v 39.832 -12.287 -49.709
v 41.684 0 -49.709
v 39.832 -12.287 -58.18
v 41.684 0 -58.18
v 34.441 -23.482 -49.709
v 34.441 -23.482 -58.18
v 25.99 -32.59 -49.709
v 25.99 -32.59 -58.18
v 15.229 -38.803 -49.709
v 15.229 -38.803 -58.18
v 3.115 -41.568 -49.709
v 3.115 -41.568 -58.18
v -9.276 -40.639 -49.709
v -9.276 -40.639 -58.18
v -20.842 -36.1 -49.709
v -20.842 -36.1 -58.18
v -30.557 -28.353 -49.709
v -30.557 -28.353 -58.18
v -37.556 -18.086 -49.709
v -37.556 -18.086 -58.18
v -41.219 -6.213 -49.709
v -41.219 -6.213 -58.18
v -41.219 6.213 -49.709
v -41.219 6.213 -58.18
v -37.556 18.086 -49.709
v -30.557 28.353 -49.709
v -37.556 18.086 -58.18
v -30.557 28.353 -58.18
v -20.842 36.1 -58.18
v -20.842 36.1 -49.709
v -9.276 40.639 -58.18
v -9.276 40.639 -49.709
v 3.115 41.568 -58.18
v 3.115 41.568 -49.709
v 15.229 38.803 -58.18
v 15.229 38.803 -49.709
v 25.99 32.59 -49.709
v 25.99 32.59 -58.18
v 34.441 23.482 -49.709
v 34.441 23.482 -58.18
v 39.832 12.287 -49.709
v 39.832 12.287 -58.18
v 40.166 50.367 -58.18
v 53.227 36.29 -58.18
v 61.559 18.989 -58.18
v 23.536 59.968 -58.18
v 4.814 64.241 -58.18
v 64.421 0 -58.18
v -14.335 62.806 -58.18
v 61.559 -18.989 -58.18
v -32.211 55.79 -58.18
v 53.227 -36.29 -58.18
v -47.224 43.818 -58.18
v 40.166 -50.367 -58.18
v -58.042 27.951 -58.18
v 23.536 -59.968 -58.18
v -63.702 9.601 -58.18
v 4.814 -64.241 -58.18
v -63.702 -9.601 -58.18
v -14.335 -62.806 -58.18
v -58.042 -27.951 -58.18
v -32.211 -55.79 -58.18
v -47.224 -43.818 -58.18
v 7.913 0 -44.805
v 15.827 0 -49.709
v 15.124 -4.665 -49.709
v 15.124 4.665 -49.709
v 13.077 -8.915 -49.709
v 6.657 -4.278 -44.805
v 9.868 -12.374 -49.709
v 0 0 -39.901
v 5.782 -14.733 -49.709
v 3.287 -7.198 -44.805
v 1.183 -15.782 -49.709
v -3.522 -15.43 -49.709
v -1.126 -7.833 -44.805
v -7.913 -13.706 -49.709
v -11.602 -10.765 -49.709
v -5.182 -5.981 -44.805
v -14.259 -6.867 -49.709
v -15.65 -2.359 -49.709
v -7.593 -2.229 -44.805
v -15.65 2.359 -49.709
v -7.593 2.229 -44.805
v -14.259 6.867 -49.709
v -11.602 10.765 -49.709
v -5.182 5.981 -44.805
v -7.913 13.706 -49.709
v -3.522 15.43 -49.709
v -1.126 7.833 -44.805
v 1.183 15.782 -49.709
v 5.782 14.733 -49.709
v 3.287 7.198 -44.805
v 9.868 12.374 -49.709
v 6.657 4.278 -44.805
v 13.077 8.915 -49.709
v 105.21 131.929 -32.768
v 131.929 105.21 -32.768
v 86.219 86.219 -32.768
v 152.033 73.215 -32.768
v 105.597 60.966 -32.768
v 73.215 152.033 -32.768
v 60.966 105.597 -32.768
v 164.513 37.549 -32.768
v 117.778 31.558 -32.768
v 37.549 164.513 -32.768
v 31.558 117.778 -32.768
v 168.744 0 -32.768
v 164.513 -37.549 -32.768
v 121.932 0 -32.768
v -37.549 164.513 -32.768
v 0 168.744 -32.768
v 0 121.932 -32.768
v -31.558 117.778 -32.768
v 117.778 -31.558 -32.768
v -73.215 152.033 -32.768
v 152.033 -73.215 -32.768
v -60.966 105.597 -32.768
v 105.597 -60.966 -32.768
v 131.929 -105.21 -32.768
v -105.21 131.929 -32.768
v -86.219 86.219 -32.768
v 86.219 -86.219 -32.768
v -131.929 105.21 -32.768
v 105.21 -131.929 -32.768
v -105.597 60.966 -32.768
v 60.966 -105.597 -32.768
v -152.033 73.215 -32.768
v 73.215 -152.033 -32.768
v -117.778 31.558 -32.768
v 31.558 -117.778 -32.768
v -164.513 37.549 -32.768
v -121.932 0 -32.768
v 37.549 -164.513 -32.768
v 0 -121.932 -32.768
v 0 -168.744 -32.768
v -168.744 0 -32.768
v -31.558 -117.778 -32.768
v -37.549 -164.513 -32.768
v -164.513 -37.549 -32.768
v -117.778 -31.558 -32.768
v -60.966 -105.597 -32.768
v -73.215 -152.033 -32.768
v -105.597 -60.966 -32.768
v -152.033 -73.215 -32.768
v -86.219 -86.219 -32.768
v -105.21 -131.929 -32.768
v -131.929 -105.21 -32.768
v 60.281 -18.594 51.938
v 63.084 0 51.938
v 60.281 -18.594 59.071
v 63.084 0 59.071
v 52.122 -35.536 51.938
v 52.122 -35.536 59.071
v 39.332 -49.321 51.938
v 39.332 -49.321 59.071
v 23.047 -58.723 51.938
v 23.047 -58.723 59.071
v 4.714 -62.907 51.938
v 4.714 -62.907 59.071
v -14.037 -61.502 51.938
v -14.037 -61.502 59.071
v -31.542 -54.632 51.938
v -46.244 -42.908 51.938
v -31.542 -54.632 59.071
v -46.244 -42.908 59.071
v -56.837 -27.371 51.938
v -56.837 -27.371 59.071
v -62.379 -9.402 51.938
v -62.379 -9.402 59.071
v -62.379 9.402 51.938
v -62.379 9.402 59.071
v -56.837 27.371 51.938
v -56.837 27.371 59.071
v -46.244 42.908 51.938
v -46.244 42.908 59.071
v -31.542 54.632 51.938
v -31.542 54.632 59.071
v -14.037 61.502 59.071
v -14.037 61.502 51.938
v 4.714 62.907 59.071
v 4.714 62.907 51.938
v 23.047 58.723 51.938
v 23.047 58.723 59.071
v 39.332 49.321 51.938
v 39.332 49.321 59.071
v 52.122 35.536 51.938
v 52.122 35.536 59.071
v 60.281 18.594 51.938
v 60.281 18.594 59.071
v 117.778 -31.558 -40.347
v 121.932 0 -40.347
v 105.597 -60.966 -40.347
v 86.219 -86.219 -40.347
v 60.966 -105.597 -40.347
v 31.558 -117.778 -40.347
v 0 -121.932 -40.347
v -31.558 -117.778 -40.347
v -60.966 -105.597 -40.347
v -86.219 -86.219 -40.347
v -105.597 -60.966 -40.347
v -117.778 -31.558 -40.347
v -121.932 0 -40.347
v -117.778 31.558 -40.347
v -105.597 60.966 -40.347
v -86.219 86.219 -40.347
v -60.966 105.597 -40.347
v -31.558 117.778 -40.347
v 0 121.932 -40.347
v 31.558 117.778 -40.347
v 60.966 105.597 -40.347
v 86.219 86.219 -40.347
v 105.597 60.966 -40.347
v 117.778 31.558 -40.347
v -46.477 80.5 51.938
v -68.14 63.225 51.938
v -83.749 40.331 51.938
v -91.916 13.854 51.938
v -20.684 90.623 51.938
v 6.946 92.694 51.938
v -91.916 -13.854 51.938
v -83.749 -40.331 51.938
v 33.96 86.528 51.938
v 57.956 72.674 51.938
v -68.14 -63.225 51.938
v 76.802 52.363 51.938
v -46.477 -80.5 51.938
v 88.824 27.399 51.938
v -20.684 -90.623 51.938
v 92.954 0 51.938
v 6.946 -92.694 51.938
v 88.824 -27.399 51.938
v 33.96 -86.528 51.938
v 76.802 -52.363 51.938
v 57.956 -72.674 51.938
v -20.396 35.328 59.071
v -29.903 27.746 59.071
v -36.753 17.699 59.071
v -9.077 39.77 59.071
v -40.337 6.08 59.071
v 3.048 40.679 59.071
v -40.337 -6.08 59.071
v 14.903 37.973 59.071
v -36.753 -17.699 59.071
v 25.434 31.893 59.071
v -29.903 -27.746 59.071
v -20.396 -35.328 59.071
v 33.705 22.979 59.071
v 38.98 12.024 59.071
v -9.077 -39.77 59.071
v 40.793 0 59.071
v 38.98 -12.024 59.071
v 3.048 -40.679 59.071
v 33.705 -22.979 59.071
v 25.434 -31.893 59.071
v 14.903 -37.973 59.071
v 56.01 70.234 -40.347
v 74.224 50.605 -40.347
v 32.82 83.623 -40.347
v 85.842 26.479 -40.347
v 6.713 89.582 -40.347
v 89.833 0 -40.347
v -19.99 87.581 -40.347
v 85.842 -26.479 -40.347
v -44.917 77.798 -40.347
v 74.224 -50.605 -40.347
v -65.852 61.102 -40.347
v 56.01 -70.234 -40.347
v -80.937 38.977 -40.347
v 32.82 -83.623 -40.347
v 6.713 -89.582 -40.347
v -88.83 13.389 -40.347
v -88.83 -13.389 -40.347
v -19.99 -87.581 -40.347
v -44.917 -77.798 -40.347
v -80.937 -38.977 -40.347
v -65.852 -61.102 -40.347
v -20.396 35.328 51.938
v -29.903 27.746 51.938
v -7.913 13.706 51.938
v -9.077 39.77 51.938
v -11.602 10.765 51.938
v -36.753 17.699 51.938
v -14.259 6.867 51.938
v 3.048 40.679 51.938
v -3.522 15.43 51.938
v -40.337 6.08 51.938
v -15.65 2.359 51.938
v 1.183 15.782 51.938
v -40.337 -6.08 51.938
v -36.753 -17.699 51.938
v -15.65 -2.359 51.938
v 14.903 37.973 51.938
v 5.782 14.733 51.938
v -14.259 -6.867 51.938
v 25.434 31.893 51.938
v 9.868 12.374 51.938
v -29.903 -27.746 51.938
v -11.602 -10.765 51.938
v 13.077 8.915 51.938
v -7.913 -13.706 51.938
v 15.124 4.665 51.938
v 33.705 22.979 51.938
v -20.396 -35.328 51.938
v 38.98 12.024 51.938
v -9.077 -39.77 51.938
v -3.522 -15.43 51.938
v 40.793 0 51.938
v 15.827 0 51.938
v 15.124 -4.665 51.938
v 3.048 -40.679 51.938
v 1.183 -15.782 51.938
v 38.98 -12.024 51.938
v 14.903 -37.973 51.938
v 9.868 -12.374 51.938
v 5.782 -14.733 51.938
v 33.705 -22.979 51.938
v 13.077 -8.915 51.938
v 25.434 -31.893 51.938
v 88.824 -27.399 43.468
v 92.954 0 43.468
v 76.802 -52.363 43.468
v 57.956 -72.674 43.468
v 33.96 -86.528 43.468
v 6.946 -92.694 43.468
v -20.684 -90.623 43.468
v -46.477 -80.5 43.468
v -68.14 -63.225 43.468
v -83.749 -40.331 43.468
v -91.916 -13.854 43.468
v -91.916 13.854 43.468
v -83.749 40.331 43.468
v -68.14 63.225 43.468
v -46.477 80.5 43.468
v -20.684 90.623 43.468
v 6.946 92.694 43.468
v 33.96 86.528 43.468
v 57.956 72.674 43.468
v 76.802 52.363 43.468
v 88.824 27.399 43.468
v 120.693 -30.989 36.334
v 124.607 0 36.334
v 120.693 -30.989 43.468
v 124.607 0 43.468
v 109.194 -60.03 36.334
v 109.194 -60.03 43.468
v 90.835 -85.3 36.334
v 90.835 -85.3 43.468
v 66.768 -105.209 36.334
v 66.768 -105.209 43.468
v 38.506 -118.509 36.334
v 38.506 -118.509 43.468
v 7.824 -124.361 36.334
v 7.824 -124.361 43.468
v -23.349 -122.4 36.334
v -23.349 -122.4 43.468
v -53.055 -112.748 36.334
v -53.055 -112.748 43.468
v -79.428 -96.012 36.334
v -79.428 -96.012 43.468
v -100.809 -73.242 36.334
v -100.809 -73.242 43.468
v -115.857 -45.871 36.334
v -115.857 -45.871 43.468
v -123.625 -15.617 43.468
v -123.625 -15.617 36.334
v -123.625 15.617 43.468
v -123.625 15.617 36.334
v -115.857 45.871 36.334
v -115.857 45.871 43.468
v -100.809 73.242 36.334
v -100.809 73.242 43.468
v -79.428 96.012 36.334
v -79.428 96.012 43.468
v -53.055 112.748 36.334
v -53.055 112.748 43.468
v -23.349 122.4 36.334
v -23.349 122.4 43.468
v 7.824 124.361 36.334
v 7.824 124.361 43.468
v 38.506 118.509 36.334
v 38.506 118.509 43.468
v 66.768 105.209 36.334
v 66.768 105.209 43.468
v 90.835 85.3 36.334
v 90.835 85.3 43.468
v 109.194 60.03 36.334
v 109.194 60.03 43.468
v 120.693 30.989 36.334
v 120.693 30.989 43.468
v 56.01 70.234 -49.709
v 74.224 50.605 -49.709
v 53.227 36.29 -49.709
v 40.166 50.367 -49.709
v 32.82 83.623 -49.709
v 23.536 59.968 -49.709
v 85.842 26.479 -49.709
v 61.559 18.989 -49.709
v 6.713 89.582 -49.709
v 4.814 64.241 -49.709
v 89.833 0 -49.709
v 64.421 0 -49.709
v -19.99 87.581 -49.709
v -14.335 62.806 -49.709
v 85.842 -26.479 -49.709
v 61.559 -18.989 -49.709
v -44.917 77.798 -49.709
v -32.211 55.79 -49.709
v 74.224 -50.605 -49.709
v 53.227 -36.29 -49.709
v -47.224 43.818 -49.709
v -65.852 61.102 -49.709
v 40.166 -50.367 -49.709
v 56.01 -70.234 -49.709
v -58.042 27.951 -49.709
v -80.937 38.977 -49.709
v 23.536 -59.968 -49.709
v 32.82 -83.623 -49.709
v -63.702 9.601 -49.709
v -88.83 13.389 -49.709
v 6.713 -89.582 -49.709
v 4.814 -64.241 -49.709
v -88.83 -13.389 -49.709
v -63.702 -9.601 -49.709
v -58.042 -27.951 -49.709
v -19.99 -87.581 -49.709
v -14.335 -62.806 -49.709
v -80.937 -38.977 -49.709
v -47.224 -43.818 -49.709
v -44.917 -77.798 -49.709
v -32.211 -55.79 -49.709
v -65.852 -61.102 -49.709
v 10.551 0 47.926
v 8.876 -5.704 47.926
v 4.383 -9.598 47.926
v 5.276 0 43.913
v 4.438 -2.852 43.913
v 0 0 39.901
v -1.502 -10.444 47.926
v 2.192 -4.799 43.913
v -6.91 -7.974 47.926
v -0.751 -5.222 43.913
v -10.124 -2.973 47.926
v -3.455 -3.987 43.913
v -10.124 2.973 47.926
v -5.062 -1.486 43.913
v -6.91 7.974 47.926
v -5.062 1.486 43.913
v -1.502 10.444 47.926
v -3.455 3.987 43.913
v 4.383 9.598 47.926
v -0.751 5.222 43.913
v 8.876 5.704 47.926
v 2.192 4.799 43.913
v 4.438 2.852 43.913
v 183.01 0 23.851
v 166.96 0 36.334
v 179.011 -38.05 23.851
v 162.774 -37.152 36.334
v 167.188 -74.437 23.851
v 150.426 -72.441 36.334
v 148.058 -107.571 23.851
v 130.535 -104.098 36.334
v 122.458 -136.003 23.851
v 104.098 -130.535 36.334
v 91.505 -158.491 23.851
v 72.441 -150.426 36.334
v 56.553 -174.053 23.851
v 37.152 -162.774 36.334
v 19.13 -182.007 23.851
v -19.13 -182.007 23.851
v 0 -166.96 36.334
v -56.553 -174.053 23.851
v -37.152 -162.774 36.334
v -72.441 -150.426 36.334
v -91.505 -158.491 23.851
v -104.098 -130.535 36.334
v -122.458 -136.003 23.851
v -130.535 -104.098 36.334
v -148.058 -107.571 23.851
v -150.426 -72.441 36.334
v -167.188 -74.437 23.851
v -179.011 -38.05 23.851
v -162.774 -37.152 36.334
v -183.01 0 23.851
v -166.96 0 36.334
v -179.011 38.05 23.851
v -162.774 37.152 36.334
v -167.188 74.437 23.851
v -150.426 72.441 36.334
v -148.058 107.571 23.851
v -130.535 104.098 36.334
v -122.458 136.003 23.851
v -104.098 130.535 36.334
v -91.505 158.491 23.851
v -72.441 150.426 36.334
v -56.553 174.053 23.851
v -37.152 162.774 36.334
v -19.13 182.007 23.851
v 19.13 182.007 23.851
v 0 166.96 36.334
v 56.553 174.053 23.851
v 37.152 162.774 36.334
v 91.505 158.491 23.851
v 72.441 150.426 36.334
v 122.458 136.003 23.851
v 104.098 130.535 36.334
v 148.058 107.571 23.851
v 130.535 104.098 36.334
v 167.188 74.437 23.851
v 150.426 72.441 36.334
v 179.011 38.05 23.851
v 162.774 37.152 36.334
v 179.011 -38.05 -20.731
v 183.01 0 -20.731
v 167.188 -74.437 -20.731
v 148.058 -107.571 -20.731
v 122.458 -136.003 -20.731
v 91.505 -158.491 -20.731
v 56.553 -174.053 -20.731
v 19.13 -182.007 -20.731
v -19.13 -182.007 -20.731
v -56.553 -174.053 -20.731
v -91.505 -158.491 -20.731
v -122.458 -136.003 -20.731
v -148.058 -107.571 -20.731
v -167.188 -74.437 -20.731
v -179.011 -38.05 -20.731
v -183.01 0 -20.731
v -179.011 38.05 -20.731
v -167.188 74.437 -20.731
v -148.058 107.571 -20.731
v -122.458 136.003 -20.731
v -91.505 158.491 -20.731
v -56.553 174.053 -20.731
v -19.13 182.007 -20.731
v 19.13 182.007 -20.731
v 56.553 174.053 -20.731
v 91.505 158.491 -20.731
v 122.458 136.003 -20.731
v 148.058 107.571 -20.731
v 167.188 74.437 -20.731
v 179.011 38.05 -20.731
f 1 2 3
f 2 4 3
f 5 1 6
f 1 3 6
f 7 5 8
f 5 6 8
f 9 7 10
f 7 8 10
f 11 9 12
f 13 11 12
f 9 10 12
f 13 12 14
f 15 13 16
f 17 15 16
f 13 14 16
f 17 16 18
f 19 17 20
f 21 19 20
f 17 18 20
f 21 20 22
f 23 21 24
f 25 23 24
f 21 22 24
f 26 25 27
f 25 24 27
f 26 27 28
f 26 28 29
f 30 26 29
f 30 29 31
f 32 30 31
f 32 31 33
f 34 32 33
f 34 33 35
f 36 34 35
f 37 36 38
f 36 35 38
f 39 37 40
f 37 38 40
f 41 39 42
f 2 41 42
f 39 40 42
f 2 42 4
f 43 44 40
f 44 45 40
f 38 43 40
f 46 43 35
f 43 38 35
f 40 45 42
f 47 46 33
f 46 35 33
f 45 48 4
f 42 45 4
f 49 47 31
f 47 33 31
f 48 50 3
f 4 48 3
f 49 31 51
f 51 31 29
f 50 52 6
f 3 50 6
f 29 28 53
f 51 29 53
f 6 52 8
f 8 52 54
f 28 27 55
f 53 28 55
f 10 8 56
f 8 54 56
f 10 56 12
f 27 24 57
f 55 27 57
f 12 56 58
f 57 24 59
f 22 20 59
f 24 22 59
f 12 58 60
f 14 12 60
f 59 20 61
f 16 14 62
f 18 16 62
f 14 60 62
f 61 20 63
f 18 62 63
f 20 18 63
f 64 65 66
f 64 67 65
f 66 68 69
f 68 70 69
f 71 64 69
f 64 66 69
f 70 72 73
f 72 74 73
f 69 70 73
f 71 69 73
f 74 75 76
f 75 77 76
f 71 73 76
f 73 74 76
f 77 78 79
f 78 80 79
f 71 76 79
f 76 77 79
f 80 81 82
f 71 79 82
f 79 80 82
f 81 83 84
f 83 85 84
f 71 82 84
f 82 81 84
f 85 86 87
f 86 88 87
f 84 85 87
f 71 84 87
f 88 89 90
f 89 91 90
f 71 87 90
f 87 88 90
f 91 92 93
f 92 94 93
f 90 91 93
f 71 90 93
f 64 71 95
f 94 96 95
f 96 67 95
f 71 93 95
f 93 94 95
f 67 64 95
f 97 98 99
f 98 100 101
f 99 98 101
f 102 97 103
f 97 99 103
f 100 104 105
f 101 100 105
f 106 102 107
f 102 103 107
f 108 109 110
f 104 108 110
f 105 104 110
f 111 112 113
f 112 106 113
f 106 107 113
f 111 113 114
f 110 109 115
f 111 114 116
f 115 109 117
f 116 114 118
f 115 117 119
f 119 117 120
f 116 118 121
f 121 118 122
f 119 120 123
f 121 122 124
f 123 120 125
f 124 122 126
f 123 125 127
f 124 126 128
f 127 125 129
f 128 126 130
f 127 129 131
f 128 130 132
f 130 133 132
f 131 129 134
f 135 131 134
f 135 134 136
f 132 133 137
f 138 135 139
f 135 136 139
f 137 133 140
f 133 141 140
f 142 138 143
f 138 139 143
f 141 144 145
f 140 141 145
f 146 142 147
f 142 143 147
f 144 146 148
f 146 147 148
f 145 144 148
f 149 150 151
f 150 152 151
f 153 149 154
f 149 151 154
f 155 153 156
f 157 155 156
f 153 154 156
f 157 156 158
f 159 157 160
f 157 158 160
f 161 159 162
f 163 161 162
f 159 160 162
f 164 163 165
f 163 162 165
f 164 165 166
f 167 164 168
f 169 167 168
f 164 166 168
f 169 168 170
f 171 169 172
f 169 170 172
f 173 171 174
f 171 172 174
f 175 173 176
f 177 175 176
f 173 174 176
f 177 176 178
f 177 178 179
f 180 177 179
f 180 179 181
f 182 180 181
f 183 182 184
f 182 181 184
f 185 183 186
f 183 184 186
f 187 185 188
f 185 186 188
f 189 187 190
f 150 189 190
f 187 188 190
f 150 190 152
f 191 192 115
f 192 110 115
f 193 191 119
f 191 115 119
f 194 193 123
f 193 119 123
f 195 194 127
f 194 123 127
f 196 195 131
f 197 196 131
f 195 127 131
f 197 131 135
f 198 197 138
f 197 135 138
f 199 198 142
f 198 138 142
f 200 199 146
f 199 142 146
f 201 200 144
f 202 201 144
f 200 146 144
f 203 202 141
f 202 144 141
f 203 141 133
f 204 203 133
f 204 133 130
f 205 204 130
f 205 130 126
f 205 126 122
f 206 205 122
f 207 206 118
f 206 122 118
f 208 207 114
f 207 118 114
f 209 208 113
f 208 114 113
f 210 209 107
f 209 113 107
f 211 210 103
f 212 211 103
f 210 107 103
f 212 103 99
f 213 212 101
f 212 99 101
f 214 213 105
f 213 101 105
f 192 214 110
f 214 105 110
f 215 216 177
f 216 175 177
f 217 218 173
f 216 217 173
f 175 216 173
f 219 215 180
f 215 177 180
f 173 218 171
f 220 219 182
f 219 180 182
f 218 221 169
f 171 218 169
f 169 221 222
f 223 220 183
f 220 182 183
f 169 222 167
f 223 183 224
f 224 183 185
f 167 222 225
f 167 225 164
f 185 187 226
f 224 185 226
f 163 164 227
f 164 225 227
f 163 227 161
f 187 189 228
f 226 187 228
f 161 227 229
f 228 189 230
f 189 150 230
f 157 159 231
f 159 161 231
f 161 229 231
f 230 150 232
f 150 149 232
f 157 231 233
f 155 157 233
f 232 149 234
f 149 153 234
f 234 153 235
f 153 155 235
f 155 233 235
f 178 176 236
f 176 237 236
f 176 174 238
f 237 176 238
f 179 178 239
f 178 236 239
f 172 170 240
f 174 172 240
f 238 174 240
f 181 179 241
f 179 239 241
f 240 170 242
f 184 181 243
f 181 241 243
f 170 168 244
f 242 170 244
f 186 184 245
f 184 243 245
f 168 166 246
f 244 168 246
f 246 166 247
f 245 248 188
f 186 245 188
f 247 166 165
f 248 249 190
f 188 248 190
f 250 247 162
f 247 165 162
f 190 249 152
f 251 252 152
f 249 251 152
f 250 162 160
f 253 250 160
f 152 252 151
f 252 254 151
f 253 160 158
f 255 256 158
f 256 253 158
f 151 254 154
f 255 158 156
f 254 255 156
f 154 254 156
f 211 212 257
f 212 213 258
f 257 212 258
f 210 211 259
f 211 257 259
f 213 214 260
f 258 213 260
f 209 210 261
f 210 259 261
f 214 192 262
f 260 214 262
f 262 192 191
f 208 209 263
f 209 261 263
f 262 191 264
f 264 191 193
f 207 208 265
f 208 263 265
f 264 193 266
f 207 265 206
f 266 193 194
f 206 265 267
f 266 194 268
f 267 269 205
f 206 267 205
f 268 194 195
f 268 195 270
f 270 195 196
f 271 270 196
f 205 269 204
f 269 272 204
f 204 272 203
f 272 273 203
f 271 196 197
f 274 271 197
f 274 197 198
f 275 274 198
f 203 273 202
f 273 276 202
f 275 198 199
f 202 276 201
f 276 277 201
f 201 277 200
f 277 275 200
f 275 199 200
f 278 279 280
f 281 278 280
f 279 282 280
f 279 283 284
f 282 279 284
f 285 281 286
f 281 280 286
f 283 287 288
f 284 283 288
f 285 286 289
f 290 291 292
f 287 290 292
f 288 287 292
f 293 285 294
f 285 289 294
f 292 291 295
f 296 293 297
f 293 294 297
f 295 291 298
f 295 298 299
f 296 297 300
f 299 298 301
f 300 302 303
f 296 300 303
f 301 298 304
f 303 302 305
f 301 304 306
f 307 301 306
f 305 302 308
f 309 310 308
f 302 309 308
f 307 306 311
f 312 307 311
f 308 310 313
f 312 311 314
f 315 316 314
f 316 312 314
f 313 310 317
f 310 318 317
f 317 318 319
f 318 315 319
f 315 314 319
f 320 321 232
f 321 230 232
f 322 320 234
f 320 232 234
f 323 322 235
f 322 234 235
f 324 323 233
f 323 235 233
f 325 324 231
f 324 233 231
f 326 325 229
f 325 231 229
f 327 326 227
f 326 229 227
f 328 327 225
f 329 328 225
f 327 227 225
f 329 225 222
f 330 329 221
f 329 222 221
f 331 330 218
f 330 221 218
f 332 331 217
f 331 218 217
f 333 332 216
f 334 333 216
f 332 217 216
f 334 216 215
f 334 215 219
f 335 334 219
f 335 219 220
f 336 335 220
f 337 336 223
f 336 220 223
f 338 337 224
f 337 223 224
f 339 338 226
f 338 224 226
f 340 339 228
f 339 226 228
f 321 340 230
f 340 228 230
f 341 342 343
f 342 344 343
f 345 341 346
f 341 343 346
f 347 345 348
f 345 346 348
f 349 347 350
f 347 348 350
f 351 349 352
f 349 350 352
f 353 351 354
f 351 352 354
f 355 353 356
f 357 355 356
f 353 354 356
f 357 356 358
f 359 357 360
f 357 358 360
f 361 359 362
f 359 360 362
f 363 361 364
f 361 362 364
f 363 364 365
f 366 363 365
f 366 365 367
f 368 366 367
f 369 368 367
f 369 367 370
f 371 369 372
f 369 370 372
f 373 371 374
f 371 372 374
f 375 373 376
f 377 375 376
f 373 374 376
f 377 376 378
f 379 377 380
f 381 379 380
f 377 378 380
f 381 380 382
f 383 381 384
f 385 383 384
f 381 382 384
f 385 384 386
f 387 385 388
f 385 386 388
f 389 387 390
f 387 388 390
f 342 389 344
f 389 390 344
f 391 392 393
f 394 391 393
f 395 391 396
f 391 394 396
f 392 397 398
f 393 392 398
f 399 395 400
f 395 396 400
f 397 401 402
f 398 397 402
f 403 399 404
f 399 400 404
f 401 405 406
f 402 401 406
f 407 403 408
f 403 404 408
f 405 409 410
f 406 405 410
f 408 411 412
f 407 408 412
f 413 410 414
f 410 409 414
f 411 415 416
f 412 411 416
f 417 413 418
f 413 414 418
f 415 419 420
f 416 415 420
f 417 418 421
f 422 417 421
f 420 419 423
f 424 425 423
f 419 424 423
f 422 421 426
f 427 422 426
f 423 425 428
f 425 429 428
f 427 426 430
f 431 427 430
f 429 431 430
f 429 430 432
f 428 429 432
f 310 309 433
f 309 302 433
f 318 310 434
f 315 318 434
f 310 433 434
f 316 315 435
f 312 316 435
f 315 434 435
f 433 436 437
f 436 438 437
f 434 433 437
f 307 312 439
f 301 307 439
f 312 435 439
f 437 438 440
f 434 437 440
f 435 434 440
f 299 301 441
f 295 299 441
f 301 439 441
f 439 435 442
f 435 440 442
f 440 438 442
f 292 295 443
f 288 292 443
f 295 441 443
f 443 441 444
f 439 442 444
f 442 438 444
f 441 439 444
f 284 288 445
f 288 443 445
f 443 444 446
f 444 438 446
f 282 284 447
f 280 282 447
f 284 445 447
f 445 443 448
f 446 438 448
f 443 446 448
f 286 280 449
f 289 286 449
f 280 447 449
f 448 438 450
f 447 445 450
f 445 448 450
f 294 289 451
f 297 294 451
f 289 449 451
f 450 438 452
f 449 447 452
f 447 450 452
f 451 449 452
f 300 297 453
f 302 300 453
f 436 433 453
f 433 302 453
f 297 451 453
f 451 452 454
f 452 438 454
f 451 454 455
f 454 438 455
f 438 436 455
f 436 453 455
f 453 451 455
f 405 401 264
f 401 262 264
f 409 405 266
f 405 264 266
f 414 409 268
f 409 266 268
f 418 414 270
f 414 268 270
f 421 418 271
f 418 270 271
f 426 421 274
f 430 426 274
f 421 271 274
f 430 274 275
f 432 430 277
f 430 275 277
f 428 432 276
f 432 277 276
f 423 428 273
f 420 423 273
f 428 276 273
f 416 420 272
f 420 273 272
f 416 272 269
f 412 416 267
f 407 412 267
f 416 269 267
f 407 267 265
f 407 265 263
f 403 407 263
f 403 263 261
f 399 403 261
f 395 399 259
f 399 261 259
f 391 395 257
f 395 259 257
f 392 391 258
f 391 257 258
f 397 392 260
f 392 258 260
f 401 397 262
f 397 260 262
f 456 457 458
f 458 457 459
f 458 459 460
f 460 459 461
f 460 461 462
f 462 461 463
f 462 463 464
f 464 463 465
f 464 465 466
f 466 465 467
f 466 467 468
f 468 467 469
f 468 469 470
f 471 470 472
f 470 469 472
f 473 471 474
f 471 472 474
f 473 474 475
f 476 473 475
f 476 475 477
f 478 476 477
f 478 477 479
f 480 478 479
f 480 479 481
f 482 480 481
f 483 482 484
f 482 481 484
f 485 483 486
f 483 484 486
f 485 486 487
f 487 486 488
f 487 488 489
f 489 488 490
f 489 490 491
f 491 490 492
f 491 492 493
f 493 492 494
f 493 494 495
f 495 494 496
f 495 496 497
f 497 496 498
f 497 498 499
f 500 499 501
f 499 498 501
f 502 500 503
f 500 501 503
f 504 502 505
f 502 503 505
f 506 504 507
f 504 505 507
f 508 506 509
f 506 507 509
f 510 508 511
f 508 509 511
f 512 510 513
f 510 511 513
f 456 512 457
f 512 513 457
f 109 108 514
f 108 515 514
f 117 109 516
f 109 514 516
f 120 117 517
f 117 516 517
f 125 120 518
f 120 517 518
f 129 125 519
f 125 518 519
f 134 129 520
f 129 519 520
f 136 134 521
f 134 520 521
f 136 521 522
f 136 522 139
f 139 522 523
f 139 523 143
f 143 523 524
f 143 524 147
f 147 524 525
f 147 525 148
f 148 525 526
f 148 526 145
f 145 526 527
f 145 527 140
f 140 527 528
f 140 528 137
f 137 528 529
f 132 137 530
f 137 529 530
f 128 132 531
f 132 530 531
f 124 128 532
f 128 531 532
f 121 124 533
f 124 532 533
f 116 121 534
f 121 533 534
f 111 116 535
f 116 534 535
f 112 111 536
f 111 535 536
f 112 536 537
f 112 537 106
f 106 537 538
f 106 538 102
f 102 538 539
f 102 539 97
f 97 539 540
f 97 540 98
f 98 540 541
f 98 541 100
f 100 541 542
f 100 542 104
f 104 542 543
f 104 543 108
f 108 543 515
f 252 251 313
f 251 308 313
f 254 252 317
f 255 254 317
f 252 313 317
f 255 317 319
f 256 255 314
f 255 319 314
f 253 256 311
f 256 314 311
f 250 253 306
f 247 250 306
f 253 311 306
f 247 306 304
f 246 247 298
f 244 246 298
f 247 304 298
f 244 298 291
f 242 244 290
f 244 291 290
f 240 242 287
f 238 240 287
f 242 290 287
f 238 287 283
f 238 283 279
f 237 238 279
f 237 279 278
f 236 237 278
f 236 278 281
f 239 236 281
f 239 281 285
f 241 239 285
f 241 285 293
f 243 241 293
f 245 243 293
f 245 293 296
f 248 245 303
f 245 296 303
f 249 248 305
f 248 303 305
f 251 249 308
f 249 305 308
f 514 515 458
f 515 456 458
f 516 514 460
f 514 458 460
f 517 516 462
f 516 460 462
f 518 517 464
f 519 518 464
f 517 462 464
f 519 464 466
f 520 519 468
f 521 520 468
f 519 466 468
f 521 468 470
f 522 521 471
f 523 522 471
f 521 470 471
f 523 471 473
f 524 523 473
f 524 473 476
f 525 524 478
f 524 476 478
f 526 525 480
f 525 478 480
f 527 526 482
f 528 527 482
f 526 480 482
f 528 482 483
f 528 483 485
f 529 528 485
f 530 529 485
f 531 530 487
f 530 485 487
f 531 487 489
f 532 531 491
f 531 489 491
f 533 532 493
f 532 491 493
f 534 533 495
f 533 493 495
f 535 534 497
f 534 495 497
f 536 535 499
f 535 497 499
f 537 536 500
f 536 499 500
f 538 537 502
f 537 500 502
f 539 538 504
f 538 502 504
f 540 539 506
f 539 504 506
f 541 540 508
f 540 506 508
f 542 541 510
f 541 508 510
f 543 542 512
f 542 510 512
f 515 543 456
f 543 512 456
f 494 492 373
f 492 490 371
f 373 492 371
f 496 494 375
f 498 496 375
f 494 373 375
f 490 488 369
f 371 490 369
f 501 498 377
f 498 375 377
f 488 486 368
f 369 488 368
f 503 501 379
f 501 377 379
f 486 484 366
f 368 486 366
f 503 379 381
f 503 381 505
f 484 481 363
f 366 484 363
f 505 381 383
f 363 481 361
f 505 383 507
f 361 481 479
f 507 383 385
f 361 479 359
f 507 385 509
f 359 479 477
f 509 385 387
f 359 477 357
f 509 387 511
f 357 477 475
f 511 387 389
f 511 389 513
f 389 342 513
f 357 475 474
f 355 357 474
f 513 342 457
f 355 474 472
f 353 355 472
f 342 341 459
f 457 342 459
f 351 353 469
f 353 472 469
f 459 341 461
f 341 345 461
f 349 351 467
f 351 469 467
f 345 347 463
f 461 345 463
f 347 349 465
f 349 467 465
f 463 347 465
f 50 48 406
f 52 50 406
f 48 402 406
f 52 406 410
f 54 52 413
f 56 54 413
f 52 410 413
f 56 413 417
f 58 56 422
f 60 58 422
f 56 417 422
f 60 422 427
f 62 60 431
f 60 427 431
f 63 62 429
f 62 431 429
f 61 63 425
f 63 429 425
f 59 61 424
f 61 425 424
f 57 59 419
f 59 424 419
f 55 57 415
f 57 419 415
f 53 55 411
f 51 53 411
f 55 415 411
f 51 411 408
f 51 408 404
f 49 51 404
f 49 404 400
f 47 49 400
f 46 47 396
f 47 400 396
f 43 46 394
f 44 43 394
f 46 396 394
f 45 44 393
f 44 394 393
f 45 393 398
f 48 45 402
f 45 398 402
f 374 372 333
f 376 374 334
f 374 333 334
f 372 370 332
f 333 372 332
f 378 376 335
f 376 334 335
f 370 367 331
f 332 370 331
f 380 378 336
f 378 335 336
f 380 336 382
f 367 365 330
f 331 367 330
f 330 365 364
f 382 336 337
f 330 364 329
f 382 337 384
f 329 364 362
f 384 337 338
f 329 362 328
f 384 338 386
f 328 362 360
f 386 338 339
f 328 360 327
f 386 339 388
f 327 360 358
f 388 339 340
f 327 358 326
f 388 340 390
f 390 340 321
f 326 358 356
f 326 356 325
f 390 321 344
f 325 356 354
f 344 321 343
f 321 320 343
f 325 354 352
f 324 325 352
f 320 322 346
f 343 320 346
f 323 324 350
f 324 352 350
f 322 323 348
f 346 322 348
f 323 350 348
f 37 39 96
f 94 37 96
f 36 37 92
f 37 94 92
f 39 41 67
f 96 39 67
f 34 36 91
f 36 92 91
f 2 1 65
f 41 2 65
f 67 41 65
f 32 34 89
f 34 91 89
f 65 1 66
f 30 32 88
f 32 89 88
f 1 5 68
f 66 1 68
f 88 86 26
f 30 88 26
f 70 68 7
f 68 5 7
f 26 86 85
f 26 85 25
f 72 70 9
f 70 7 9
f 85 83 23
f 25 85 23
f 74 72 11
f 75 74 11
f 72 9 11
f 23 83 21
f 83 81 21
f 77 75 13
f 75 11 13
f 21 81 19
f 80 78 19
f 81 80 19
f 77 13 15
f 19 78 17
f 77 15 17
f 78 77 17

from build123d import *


with BuildPart() as f1:
    # F0 (on Front) → F1 (revolve)
    with BuildSketch(Plane.XZ):
        Polygon((64.421296, -7.356068), (41.684367, -7.356068), (41.684367, -45.696769), (41.684367, -49.709167), (41.684367, -58.179785), (64.421296, -58.179785), (64.421296, -49.709167), align=None)
        Polygon((63.083835, 51.938269), (63.083835, 17.164147), (92.062272, 17.164147), (92.953913, 43.467648), (92.953913, 51.938269), align=None)
        Polygon((92.953913, 43.467648), (92.062272, 17.164147), (106.328569, 17.164147), (115.358189, 6.462383), (123.450934, 6.462383), (124.607272, 36.334496), (124.607272, 43.467648), align=None)
        Polygon((123.450934, 6.462383), (115.358189, 6.462383), (106.328569, -7.356068), (89.833163, -7.356068), (89.833163, -40.346902), (121.932343, -40.346902), (121.932343, -32.767929), align=None)
        Polygon((183.009967, 6.462383), (123.450934, 6.462383), (121.932343, -32.767929), (168.74367, -32.767929), (183.009967, -20.730732), align=None)
        Polygon((89.833163, -7.356068), (64.421296, -7.356068), (64.421296, -49.709167), (89.833163, -49.709167), (89.833163, -40.346902), align=None)
        Polygon((40.792722, 17.164147), (0, 17.164147), (0, 8.693527), (92.062272, 8.693527), (99.641241, 5.12695), (91.170624, 0), (0, 0), (0, -7.356068), (41.684367, -7.356068), (64.421296, -7.356068), (89.833163, -7.356068), (106.328569, -7.356068), (115.358189, 6.462383), (106.328569, 17.164147), (92.062272, 17.164147), (63.083835, 17.164147), align=None)
        Polygon((40.792722, 51.938269), (40.792722, 17.164147), (63.083835, 17.164147), (63.083835, 51.938269), (63.083835, 59.071422), (40.792722, 59.071422), align=None)
        Polygon((124.607272, 36.334496), (123.450934, 6.462383), (183.009967, 6.462383), (183.009967, 23.851477), (166.960374, 36.334496), align=None)
        Polygon((92.062272, 8.693527), (0, 8.693527), (0, 0), (91.170624, 0), (99.641241, 5.12695), align=None)
        Polygon((41.684367, -7.356068), (0, -7.356068), (0, -39.901081), (15.826687, -49.709167), (41.684367, -49.709167), (41.684367, -45.696769), align=None)
        Polygon((15.826687, 51.938269), (0, 39.901074), (0, 17.164147), (40.792722, 17.164147), (40.792722, 51.938269), align=None)
    revolve(axis=Axis((0, 0, -4e-06), (0, 0, -1)))


solid = f1.part
